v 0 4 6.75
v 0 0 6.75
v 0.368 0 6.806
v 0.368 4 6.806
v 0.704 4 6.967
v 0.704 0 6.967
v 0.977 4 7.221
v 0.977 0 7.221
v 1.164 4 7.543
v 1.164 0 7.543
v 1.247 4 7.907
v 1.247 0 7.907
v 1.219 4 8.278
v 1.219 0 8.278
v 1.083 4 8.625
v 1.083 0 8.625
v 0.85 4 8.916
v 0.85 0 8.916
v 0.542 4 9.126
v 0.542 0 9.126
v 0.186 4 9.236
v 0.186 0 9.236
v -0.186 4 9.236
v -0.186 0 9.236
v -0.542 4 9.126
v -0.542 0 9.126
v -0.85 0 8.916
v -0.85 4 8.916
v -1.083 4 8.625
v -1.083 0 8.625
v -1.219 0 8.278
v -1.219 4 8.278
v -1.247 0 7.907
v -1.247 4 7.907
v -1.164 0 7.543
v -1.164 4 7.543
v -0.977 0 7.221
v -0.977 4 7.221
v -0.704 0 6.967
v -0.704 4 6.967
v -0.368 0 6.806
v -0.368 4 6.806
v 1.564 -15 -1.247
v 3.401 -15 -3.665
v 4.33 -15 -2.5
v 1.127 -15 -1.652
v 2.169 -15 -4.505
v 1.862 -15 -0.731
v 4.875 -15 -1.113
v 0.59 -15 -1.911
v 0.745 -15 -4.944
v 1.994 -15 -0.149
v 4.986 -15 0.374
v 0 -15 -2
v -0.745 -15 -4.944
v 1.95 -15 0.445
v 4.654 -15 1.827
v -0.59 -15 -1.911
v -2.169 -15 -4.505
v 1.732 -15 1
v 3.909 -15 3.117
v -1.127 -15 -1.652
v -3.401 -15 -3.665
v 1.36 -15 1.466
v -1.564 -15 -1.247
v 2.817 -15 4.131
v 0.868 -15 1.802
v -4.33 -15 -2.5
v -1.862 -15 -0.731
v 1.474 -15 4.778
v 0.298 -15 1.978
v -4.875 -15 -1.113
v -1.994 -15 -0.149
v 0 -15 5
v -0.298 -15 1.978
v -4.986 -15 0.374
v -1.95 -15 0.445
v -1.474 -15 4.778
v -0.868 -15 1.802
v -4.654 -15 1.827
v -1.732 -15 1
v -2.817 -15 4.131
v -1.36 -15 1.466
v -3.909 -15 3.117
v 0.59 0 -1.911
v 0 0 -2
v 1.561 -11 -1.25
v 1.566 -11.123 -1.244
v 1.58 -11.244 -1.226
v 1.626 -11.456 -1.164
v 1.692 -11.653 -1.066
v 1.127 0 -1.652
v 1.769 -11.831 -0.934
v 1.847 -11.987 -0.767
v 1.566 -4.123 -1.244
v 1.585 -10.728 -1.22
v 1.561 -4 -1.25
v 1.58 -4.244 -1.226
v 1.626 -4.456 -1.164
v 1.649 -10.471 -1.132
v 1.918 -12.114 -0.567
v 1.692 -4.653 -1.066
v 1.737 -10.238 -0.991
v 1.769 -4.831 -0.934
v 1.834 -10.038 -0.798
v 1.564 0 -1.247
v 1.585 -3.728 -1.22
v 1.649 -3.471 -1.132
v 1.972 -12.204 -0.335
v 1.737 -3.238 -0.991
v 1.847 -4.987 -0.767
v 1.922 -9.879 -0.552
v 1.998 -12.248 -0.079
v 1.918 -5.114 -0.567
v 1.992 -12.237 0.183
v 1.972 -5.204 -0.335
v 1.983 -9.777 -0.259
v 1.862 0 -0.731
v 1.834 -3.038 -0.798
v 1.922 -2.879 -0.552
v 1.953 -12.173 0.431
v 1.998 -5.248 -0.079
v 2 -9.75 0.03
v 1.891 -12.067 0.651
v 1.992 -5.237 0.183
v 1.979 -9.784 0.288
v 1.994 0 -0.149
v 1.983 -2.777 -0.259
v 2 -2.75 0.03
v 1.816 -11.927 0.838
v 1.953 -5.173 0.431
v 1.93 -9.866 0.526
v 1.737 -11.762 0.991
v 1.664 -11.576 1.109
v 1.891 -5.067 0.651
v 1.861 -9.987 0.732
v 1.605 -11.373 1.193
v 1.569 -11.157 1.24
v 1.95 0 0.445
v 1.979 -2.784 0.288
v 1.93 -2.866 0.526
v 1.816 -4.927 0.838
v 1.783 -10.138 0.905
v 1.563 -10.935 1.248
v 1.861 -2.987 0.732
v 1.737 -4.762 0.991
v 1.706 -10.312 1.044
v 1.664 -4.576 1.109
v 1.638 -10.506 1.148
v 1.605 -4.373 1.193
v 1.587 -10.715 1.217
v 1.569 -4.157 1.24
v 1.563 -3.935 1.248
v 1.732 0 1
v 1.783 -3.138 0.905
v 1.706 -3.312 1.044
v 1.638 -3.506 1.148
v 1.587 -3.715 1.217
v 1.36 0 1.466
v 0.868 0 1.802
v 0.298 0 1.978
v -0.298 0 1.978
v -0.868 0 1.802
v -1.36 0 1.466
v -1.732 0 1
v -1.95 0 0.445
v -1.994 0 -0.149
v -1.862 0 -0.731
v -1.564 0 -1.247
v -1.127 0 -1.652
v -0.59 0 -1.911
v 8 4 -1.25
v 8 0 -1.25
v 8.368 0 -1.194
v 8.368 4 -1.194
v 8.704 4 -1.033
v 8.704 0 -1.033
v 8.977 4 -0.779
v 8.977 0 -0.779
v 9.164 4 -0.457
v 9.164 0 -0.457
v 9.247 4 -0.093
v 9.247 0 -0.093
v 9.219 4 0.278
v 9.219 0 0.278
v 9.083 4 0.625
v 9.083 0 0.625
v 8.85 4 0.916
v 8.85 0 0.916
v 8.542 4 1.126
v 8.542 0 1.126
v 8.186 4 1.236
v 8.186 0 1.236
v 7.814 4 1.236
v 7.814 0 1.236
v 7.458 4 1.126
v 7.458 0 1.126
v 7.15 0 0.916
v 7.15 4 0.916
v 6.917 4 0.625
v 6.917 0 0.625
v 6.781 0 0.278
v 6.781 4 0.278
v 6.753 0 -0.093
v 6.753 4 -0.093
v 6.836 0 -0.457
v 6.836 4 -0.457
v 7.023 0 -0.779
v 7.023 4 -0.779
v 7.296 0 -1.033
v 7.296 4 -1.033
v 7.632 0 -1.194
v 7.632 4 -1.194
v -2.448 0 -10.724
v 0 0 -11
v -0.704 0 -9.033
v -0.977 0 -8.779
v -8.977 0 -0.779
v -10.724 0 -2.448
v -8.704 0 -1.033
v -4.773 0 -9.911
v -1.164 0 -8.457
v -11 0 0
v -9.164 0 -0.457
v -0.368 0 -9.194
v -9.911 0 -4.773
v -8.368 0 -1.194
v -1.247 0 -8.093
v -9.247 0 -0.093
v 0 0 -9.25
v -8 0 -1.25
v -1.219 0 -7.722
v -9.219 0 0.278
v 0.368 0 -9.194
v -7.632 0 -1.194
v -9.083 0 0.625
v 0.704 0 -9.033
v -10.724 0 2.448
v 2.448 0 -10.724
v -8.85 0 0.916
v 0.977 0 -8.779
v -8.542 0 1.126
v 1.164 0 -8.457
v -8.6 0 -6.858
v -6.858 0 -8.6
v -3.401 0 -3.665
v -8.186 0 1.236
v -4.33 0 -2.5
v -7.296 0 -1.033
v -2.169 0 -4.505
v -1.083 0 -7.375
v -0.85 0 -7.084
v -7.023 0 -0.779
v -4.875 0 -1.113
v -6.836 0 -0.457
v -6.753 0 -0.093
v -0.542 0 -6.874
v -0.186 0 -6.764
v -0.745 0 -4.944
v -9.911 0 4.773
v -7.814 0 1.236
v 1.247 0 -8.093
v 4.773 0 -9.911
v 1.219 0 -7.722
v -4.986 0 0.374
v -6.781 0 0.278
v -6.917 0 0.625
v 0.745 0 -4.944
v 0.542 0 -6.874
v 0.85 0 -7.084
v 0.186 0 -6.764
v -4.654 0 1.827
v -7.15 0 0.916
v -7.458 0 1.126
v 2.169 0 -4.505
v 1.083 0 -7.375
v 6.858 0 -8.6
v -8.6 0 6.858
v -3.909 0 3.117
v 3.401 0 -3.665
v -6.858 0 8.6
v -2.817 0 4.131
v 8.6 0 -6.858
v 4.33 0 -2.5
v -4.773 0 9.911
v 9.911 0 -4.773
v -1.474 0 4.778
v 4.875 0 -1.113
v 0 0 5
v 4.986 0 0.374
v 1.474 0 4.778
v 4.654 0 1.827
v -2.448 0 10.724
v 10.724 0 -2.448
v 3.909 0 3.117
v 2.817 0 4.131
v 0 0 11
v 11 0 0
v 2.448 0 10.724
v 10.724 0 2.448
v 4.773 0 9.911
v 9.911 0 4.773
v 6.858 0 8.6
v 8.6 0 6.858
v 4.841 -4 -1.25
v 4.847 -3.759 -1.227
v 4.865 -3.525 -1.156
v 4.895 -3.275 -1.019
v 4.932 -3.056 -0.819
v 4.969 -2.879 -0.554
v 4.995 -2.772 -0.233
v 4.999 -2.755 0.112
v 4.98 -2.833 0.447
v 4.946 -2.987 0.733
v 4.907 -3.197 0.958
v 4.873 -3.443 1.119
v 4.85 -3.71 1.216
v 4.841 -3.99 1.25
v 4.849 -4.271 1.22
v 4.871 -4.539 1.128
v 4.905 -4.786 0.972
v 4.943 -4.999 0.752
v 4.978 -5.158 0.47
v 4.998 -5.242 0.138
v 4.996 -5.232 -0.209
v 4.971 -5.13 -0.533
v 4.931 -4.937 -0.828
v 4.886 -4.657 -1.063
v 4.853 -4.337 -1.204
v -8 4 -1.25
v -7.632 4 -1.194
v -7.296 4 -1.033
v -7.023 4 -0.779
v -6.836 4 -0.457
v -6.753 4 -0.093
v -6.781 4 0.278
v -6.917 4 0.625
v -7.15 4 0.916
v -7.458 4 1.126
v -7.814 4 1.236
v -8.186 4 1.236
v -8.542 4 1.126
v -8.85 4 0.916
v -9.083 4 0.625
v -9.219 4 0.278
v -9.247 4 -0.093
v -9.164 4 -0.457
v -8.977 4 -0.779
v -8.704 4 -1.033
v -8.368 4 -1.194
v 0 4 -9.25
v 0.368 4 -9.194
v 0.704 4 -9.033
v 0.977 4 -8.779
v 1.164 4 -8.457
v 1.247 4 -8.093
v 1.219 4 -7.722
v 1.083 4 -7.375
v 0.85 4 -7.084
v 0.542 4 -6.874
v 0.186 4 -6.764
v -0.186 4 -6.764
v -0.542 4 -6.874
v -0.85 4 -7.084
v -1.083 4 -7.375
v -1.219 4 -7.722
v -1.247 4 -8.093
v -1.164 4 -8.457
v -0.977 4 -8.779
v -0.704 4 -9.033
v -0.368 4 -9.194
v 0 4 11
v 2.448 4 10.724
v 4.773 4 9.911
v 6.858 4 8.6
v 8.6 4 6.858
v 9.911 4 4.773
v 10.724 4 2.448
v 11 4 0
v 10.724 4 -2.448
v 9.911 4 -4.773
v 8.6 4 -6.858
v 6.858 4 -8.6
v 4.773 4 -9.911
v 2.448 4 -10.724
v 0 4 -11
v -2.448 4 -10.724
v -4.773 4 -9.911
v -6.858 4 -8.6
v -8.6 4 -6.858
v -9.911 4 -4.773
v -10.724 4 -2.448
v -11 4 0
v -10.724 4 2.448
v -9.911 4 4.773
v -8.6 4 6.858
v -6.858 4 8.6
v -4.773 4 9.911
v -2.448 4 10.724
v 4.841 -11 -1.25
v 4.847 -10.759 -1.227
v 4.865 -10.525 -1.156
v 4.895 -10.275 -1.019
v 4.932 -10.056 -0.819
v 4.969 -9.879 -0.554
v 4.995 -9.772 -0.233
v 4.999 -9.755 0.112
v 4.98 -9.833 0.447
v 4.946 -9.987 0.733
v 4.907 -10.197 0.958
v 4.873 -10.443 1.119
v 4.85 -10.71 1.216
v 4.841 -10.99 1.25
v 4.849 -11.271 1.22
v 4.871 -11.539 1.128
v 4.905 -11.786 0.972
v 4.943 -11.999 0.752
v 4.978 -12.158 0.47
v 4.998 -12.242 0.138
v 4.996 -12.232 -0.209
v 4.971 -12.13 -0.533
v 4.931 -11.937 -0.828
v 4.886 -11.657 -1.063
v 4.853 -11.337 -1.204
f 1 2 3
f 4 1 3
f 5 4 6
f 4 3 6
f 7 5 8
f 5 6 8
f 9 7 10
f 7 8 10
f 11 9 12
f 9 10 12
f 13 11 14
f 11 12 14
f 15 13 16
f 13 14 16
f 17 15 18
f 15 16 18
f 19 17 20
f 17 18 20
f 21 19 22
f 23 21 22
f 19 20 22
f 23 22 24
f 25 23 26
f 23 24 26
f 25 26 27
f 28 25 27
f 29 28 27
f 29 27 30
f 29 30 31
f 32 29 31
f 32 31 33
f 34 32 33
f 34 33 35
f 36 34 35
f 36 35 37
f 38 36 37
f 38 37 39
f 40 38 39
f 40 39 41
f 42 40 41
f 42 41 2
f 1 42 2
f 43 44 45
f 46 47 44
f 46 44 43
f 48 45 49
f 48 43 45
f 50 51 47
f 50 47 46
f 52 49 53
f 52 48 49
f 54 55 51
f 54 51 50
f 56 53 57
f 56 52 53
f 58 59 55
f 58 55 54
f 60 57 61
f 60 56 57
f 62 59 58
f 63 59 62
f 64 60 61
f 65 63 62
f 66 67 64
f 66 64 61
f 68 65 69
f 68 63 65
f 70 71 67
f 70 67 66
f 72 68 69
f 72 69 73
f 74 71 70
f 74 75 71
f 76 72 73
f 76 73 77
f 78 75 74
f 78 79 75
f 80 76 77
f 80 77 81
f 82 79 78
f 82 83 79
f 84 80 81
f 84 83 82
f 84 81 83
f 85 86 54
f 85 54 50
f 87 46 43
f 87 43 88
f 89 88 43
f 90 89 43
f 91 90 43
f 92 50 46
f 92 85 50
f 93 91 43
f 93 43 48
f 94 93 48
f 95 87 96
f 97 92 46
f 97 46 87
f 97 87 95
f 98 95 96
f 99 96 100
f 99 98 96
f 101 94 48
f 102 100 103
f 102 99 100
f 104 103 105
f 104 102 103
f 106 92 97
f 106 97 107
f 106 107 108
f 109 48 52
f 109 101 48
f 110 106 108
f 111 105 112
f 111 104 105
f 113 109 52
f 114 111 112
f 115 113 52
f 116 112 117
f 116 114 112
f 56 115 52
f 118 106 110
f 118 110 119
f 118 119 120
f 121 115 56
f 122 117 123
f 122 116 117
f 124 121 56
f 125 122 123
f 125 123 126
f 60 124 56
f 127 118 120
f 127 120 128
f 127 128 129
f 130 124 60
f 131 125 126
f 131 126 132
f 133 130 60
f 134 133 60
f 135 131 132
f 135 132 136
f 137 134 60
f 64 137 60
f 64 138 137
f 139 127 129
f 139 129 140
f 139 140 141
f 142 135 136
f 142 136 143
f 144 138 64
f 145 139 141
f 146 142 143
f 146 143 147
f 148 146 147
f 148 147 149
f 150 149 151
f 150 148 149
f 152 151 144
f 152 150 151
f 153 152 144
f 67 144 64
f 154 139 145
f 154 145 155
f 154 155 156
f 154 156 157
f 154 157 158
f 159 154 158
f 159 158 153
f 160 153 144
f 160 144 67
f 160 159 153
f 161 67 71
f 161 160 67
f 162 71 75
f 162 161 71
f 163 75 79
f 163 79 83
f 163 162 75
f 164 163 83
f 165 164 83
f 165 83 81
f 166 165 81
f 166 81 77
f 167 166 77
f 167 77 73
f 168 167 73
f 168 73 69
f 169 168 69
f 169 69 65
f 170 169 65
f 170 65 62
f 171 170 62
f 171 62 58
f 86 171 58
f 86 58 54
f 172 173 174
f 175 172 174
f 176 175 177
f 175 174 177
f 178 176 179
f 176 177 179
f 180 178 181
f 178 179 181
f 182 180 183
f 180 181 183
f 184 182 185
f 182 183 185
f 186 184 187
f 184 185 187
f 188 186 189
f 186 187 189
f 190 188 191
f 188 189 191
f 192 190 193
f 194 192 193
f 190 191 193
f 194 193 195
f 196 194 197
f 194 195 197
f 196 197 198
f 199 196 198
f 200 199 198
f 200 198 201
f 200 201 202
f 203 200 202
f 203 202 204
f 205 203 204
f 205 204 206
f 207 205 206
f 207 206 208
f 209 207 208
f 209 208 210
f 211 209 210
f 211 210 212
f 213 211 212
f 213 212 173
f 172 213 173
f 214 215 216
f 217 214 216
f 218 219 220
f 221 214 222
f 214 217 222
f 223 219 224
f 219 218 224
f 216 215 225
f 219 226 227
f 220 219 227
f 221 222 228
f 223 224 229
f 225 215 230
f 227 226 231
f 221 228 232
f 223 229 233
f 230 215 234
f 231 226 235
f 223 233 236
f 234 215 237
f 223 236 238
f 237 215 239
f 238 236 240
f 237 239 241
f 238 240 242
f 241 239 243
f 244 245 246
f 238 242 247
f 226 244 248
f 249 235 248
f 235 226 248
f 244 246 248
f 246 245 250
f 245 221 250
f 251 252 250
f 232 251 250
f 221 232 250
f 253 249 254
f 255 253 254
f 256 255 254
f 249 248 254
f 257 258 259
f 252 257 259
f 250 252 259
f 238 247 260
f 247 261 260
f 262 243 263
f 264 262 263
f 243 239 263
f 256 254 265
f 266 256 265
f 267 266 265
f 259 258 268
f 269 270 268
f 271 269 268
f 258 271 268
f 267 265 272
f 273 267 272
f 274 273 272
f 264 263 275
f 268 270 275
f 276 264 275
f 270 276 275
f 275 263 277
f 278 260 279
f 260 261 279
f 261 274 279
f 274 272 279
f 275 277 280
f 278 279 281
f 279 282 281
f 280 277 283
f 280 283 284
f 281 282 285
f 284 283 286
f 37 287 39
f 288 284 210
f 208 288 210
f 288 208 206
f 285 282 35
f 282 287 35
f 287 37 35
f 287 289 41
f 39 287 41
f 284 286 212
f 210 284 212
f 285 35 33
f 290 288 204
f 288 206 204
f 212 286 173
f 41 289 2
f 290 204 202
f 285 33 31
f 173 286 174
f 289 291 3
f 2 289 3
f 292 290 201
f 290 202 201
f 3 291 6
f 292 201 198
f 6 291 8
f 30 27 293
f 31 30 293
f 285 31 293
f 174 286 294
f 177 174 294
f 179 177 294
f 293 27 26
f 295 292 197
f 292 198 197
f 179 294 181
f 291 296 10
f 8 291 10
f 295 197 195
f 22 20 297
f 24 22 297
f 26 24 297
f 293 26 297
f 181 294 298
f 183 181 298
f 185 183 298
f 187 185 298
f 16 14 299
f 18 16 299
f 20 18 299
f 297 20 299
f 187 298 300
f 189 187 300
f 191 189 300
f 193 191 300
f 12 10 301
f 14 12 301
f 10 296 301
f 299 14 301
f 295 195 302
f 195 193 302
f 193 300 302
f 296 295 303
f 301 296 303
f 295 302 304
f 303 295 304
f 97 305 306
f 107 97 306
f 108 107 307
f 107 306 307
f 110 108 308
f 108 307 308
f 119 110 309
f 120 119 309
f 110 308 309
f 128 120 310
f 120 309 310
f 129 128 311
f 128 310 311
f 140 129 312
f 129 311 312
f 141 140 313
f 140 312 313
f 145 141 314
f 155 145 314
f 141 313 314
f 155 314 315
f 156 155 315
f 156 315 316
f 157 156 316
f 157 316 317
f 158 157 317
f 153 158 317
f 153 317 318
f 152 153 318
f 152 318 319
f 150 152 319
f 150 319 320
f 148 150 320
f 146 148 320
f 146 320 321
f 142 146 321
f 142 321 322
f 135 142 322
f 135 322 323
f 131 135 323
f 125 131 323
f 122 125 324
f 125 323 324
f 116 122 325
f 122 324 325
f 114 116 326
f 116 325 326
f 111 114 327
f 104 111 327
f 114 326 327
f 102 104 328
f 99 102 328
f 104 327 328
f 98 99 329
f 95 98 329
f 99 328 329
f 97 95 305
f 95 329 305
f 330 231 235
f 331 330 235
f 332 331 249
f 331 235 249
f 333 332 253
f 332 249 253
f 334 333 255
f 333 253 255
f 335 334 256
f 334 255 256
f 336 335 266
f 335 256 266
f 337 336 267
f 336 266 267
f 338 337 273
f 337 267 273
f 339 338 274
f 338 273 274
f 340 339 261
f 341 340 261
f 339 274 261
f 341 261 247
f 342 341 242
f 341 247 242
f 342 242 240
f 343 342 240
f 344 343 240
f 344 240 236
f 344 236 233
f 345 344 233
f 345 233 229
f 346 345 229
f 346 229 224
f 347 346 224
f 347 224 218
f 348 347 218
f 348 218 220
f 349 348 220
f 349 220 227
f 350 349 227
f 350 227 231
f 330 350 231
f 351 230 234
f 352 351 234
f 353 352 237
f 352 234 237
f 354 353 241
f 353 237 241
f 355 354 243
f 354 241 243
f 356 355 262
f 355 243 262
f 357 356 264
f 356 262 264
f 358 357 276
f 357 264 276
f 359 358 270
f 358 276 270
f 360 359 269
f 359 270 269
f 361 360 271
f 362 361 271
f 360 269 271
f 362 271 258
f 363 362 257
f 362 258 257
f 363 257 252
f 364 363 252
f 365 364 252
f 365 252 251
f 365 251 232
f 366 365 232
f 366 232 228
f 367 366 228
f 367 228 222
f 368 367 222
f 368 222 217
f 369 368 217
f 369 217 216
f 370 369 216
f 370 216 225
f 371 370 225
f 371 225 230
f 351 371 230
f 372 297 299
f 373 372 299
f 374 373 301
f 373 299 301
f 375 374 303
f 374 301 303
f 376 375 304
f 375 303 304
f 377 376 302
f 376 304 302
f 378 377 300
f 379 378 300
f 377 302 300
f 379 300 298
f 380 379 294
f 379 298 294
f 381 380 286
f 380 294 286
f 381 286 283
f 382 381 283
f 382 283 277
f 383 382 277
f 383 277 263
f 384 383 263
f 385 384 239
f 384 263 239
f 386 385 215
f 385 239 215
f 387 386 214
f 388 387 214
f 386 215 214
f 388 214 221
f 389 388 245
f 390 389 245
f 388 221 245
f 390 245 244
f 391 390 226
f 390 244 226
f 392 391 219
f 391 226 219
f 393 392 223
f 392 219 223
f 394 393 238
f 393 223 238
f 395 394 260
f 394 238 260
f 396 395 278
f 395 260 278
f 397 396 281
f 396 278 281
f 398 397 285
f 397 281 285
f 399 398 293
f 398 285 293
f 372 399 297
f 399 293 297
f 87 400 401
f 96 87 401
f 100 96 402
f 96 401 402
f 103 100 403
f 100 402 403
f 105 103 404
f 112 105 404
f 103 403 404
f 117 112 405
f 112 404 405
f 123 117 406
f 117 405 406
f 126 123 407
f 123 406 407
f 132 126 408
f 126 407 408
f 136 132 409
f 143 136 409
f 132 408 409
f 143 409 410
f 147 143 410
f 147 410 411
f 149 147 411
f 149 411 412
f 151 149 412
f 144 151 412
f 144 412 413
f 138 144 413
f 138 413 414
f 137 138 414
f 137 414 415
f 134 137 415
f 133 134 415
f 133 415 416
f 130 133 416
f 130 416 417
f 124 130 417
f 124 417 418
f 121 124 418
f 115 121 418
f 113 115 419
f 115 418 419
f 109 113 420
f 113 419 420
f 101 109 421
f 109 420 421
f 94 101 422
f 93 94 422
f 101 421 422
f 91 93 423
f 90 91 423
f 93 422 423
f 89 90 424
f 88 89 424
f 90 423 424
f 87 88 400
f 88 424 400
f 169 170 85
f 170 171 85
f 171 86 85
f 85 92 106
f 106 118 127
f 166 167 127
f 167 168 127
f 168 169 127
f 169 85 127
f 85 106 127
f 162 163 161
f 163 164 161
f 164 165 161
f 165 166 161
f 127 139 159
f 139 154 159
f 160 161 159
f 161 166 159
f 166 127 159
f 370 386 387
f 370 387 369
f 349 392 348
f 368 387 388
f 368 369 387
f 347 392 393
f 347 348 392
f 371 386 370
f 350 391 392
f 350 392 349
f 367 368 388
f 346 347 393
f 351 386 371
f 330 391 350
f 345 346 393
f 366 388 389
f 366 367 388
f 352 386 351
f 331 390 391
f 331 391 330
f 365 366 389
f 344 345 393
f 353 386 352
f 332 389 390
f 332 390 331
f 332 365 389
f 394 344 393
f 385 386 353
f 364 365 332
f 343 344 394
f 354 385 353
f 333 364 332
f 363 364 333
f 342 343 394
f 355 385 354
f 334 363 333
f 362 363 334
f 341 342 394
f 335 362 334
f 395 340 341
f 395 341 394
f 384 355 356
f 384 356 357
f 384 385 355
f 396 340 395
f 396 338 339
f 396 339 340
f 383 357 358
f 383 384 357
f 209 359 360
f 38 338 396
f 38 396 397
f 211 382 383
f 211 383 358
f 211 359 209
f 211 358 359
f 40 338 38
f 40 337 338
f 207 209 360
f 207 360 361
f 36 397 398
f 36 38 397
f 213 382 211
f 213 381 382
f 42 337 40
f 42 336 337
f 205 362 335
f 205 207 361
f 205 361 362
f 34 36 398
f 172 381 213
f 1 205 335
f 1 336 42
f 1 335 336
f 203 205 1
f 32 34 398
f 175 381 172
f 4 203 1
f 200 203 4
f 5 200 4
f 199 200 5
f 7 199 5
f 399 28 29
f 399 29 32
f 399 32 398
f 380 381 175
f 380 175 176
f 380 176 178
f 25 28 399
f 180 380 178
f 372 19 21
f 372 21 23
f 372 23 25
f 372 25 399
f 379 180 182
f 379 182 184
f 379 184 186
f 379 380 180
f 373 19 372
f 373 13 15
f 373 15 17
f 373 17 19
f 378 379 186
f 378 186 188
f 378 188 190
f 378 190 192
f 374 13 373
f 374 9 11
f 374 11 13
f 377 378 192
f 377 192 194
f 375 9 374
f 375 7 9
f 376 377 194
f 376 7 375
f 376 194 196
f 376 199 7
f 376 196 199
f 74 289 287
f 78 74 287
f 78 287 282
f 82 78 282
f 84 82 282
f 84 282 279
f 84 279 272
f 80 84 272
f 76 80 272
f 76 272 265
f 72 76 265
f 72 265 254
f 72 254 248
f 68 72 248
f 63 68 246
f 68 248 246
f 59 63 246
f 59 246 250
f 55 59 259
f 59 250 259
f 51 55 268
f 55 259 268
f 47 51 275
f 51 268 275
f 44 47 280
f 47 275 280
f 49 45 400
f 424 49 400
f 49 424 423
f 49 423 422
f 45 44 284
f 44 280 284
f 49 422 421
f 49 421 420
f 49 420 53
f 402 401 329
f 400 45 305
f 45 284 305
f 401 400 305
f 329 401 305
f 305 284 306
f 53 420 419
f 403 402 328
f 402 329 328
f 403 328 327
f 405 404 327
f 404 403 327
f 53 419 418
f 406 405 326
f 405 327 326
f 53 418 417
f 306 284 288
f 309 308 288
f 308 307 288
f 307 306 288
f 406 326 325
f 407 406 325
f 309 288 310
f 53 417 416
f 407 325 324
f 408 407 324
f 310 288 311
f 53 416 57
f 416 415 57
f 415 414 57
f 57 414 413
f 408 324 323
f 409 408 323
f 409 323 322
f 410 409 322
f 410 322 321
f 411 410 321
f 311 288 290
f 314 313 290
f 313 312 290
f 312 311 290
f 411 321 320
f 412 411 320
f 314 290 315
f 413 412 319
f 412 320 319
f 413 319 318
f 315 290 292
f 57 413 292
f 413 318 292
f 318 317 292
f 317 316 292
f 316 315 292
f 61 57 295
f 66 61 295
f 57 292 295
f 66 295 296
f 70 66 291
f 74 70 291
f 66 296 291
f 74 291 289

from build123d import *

# Parameters (mm, degrees)
SKETCH1_R           = 11
BOSS_EXTRUDE1_DEPTH = 4
SKETCH5_R           = 5
SKETCH5_R_2         = 2
BOSS_EXTRUDE2_DEPTH = 15
SKETCH2_R           = 1.25
CUT_EXTRUDE1_DEPTH  = 10
SKETCH20_R          = 1.25
CUT_EXTRUDE2_DEPTH  = 4


with BuildPart() as part:
    # Sketch1 → Boss-Extrude1 (new body)
    with BuildSketch(Plane(origin=(0, 0, 0), x_dir=(1, 0, 0), z_dir=(0, 1, 0))):
        with Locations(Location((0, 0, 0), (0, 0, 270))):
            Circle(SKETCH1_R)
    extrude(amount=BOSS_EXTRUDE1_DEPTH)

    # Sketch5 → Boss-Extrude2 (add)
    with BuildSketch(Plane.XZ):
        with Locations(Location((0, 0, 0), (0, 0, 90))):
            Circle(SKETCH5_R)
        with Locations(Location((0, 0, 0), (0, 0, 270))):
            Circle(SKETCH5_R_2, mode=Mode.SUBTRACT)
    extrude(amount=BOSS_EXTRUDE2_DEPTH)

    # Sketch2 → Cut-Extrude1 (cut)
    with BuildSketch(Plane.XZ):
        with Locations(Location((0, -8, 0), (0, 0, 270))):
            Circle(SKETCH2_R)
        with Locations(Location((-8, 0, 0), (0, 0, 270))):
            Circle(SKETCH2_R)
        with Locations(Location((0, 8, 0), (0, 0, 270))):
            Circle(SKETCH2_R)
        with Locations(Location((8, 0, 0), (0, 0, 270))):
            Circle(SKETCH2_R)
    extrude(amount=-CUT_EXTRUDE1_DEPTH, mode=Mode.SUBTRACT)

    # Sketch20 → Cut-Extrude2 (cut)
    with BuildSketch(Plane(origin=(5, 0, 0), x_dir=(0, 0, -1), z_dir=(1, 0, 0))):
        with Locations((0, -4)):
            Circle(SKETCH20_R)
        with Locations((0, -11)):
            Circle(SKETCH20_R)
    extrude(amount=-CUT_EXTRUDE2_DEPTH, mode=Mode.SUBTRACT)


solid = part.part
